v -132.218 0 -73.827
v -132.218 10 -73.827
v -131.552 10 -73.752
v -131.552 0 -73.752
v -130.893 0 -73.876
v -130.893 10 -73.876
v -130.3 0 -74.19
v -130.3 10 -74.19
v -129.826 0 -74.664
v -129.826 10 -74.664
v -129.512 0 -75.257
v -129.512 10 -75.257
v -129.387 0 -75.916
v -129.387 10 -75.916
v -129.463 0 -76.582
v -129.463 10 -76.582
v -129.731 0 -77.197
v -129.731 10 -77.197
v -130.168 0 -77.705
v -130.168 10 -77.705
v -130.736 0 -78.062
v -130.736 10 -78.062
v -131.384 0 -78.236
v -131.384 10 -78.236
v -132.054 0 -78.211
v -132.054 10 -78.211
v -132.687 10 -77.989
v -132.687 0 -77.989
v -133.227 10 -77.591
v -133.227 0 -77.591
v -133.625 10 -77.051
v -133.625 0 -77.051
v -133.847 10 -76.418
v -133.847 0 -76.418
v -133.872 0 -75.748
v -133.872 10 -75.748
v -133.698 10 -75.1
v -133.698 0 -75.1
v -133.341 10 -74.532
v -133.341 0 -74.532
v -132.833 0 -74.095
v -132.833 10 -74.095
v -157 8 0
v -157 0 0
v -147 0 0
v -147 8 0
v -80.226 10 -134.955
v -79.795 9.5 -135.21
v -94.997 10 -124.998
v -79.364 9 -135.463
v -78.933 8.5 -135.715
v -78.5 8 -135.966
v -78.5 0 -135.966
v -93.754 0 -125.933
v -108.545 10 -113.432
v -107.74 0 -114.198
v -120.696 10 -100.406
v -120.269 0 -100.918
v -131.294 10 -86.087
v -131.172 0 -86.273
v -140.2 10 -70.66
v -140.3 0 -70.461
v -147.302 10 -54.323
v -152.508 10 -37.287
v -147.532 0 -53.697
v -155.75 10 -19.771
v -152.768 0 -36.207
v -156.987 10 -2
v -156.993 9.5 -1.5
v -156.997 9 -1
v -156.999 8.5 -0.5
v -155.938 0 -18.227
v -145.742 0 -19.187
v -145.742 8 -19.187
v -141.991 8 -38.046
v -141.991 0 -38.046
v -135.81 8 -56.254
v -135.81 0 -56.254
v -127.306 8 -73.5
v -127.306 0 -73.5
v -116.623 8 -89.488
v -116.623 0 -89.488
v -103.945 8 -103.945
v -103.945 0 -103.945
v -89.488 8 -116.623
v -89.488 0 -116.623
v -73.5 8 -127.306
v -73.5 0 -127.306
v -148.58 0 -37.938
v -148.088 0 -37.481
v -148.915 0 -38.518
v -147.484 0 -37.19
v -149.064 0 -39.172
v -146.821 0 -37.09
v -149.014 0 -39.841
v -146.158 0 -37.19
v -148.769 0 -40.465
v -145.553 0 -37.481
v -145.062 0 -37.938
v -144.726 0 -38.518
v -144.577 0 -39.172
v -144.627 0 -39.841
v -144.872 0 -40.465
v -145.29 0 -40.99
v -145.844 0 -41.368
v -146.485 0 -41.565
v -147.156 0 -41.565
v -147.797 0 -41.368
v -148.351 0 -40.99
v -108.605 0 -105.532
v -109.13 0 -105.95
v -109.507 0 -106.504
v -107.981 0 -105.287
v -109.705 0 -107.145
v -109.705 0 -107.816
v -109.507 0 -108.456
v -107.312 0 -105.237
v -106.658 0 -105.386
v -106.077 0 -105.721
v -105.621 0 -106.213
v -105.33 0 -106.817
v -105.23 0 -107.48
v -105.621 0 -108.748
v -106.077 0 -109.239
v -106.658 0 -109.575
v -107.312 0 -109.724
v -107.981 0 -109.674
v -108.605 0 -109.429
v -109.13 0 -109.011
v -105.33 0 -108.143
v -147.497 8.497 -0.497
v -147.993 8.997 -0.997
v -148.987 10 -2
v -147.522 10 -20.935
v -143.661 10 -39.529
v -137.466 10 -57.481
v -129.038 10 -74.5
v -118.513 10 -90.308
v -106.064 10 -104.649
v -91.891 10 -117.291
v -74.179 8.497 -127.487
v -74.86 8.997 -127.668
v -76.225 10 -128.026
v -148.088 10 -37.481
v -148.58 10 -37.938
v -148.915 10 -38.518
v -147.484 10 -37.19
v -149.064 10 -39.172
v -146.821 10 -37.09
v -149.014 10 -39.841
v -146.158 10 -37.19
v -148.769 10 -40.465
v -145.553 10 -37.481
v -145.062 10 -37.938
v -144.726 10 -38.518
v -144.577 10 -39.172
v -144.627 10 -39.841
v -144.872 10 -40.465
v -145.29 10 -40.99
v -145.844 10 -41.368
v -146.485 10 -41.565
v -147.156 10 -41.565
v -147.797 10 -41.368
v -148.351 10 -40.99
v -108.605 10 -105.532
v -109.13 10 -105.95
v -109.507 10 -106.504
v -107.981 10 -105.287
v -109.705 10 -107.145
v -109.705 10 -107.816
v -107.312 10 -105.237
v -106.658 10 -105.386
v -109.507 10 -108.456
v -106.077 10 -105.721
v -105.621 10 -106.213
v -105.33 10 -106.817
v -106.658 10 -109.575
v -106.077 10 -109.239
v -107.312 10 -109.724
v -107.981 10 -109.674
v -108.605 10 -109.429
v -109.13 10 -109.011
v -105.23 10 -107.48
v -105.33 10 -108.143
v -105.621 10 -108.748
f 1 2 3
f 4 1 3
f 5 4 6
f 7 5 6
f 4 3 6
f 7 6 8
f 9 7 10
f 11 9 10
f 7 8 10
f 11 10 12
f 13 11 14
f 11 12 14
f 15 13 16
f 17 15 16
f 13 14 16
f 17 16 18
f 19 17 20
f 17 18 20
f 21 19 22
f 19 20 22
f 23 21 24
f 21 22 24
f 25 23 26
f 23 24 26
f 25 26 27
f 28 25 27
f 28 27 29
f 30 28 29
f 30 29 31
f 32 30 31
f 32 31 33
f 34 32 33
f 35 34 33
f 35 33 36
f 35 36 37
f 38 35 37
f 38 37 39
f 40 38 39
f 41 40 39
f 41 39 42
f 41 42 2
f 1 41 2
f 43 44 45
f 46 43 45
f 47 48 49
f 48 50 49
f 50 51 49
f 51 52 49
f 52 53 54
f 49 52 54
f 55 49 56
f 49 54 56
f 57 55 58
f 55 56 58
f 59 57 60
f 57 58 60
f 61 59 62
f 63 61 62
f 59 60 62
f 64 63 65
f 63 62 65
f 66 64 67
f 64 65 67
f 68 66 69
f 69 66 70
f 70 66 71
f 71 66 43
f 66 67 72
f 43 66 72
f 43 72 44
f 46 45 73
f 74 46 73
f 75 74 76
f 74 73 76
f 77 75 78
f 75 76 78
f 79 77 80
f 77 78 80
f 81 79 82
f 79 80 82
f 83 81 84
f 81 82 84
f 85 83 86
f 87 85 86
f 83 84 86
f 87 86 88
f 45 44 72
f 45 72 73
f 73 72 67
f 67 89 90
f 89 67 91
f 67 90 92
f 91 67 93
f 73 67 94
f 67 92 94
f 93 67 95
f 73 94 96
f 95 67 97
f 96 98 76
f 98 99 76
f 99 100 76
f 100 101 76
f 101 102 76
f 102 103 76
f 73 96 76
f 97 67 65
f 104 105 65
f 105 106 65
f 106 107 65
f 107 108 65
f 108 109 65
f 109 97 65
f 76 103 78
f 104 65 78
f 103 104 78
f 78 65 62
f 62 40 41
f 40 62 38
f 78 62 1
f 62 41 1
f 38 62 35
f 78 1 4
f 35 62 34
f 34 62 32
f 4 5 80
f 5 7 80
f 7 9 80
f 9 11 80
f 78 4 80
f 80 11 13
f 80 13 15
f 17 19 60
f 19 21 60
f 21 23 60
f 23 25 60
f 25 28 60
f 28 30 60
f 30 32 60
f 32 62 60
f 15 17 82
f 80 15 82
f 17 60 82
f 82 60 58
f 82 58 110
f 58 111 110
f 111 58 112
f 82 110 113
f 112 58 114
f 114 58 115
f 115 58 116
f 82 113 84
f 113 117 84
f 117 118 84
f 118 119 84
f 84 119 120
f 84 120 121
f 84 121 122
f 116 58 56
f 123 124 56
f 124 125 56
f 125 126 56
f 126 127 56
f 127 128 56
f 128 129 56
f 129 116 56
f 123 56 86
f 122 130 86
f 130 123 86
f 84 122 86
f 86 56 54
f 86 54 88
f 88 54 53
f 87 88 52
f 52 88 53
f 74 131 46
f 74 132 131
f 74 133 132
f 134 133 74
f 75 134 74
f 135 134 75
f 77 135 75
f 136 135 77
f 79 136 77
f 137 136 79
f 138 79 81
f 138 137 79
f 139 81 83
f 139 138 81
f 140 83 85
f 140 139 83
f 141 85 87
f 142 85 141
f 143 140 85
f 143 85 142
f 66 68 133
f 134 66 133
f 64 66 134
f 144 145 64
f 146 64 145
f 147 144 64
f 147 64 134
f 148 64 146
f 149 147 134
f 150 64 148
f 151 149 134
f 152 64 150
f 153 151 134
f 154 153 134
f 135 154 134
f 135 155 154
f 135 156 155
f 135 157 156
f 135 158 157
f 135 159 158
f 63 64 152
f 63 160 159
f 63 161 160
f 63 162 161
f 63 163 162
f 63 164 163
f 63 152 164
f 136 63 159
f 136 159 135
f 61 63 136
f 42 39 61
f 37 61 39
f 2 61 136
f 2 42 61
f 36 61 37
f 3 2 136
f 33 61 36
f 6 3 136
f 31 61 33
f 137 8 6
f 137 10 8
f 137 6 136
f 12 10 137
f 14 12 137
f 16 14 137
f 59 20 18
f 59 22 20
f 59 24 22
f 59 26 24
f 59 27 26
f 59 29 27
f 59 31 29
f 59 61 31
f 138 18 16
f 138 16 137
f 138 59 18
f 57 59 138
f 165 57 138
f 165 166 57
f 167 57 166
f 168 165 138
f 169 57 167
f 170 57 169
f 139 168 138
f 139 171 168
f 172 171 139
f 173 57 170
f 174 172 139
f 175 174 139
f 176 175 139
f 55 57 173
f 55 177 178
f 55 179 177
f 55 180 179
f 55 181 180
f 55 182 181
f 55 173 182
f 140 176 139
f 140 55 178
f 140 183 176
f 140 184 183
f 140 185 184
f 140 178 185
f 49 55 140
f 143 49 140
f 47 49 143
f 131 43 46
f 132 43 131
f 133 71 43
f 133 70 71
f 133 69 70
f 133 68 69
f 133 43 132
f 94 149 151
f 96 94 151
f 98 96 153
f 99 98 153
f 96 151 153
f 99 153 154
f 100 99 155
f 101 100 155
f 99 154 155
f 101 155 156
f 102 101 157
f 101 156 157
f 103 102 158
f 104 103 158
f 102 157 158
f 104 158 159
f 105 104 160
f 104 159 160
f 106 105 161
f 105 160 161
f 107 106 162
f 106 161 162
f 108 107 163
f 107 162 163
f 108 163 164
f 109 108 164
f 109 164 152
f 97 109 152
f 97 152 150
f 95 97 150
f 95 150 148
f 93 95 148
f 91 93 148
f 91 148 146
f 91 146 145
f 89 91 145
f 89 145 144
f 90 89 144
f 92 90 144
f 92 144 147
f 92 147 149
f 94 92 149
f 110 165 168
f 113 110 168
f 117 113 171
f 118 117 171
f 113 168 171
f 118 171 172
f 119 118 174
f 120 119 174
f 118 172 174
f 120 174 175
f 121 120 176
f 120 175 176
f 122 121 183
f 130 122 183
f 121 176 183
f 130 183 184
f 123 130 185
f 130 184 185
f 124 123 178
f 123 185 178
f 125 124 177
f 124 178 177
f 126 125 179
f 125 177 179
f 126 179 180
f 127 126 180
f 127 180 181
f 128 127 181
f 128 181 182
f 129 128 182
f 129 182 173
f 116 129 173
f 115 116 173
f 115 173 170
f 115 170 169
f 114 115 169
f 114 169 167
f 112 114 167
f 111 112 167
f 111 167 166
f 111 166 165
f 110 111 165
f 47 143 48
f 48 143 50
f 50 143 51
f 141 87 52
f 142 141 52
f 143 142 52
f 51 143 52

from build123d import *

# Parameters (mm, degrees)
BOSS_EXTRUDE1_DEPTH = 10
SKETCH3_R           = 2.25
CUT_EXTRUDE1_DEPTH  = 208.932080257
CIRPATTERN1_COUNT   = 3
CIRPATTERN1_ANGLE   = 30
CHAMFER1_SIZE       = 2


with BuildPart() as part:
    # Sketch2 → Boss-Extrude1 (new body)
    with BuildSketch(Plane(origin=(0, 0, 0), x_dir=(1, 0, 0), z_dir=(0, 1, 0))):
        with BuildLine():
            Line((-157, 0), (-147, 0))
            ThreePointArc((-147, 0), (-127.305734356, 73.5), (-73.5, 127.305734356))
            Line((-73.5, 127.305734356), (-78.5, 135.965988394))
            ThreePointArc((-78.5, 135.965988394), (-135.965988394, 78.5), (-157, 0))
        make_face()
    extrude(amount=BOSS_EXTRUDE1_DEPTH)

    # Sketch3 → Cut-Extrude1 (cut, through all)
    with BuildSketch(Plane(origin=(0, 10, 0), x_dir=(1, 0, 0), z_dir=(0, 1, 0))):
        with Locations(Location((-146.820725596, 39.340494856, 0), (0, 0, 270))):
            Circle(SKETCH3_R)
    cut_extrude1 = extrude(amount=-CUT_EXTRUDE1_DEPTH, mode=Mode.SUBTRACT)

    # CirPattern1: Cut-Extrude1 ×3 about axis
    cirpattern1_axis = Axis((0, 0, 0), (0, -1, 0))
    for i in range(1, CIRPATTERN1_COUNT):
        add(cut_extrude1.rotate(cirpattern1_axis, i * CIRPATTERN1_ANGLE / (CIRPATTERN1_COUNT - 1)), mode=Mode.SUBTRACT)

    # Chamfer1
    chamfer1_edges = [part.edges().sort_by_distance(p)[0] for p in [
        (-152, 10, 0),
        (-127.305734356, 10, -73.5),
        (-76, 10, -131.635861375),
    ]]
    chamfer(chamfer1_edges, length=CHAMFER1_SIZE)


solid = part.part
